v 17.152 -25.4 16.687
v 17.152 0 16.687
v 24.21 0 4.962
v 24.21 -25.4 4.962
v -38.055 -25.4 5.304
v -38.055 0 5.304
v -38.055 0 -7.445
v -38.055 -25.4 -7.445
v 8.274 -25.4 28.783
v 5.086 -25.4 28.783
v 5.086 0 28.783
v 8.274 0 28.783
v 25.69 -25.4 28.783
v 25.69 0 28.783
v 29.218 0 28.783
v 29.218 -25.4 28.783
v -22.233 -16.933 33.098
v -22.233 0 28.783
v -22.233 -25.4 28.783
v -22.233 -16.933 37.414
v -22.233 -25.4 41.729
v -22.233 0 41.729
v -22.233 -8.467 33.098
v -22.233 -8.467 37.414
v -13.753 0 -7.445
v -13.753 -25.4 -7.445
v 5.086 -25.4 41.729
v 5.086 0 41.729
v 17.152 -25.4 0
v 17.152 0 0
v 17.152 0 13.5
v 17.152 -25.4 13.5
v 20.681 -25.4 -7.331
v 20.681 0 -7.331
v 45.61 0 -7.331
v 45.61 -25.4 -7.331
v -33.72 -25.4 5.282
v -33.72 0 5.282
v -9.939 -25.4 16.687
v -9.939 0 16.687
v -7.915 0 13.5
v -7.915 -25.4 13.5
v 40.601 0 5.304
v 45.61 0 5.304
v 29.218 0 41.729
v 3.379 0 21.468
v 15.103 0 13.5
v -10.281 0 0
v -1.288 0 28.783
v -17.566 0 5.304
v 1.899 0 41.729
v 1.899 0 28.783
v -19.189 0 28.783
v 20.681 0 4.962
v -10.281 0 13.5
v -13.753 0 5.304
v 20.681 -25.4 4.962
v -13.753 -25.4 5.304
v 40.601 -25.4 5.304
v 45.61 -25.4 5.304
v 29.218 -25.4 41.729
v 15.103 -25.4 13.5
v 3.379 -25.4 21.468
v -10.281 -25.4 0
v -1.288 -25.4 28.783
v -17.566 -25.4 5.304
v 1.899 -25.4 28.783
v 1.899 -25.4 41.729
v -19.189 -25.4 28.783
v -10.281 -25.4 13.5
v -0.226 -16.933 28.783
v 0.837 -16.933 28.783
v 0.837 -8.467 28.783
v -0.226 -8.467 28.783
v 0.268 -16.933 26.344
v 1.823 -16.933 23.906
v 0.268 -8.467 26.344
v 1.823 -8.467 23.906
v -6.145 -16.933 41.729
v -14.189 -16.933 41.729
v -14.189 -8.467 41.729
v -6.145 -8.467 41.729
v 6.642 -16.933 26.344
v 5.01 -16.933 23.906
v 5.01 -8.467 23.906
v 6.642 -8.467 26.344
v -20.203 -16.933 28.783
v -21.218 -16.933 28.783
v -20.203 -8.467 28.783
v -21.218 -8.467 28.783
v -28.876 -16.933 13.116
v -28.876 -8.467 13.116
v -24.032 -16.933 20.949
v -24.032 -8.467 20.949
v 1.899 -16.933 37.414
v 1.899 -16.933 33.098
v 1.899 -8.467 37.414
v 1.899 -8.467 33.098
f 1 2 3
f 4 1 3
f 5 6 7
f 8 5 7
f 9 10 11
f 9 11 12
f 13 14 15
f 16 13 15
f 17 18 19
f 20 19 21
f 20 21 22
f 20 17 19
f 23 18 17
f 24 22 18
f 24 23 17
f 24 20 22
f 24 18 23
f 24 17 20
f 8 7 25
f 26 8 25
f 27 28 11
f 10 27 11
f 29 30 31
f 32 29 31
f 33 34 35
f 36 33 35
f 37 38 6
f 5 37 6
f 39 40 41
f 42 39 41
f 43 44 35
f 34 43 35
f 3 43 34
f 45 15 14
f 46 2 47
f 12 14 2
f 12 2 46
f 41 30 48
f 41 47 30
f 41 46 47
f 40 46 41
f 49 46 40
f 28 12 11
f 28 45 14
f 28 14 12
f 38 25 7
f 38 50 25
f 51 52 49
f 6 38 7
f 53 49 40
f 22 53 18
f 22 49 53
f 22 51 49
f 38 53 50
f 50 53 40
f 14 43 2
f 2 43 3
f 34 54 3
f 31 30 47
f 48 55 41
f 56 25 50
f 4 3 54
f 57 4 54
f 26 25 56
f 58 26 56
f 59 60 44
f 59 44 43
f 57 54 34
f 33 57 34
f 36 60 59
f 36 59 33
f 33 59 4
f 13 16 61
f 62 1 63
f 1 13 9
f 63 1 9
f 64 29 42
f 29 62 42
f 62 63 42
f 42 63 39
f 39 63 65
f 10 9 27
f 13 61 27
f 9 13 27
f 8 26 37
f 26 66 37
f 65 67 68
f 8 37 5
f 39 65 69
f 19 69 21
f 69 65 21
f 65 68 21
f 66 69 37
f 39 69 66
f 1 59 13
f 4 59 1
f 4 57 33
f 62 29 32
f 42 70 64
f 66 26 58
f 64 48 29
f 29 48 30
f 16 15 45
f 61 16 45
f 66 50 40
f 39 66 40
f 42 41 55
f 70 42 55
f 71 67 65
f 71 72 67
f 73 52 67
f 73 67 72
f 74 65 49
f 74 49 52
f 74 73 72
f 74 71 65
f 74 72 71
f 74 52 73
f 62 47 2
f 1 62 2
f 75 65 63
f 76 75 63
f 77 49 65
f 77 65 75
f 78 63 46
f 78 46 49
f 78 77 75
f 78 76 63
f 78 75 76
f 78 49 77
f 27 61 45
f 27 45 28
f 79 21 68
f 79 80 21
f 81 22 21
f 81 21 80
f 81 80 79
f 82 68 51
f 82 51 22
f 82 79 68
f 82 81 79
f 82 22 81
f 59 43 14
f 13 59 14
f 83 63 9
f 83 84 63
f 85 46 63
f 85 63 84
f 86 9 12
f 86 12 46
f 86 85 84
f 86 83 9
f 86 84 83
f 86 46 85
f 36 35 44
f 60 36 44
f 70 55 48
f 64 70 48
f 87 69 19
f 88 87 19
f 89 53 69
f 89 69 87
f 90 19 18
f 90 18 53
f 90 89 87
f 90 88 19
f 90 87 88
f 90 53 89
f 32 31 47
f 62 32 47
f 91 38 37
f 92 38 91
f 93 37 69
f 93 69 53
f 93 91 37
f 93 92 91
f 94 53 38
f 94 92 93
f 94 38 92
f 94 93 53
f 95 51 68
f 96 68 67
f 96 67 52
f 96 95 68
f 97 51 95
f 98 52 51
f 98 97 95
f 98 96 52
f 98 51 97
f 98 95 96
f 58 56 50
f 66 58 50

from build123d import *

# Parameters (mm, degrees)
F1_DEPTH = 25.4


with BuildPart() as f1:
    # F0 (on Front) → F1 (new body)
    with BuildSketch(Plane.XZ):
        with BuildLine():
            add(Edge.make_bspline(
                [(-33.719659, 5.282047), (-28.87602, 13.115586), (-24.032382, 20.949125), (-19.188743, 28.782664)],
                knots=[0, 0, 0, 0, 27.630174, 27.630174, 27.630174, 27.630174], degree=3))
            Line((-33.719659, 5.282047), (-38.055241, 5.303812))
            Line((-38.055241, 5.303812), (-38.055241, -7.445157))
            Line((-38.055241, -7.445157), (-13.75252, -7.445157))
            Line((-13.75252, -7.445157), (-13.75252, 5.303812))
            Line((-13.75252, 5.303812), (-17.565828, 5.303812))
            Line((-17.565828, 5.303812), (-9.939212, 16.686819))
            Line((-9.939212, 16.686819), (-7.91495, 13.499577))
            Line((-7.91495, 13.499577), (-10.280703, 13.499577))
            Line((-10.280703, 13.499577), (-10.280703, 0))
            Line((-10.280703, 0), (17.152347, 0))
            Line((17.152347, 0), (17.152347, 13.499577))
            Line((17.152347, 13.499577), (15.103405, 13.499577))
            Line((15.103405, 13.499577), (17.152347, 16.686819))
            Line((17.152347, 16.686819), (24.20981, 4.962322))
            Line((24.20981, 4.962322), (20.681079, 4.962322))
            Line((20.681079, 4.962322), (20.681079, -7.331326))
            Line((20.681079, -7.331326), (45.609865, -7.331326))
            Line((45.609865, -7.331326), (45.609865, 5.303812))
            Line((45.609865, 5.303812), (40.601343, 5.303812))
            Line((40.601343, 5.303812), (25.6896, 28.782664))
            Line((25.6896, 28.782664), (29.218335, 28.782664))
            Line((29.218335, 28.782664), (29.218335, 41.729435))
            Line((29.218335, 41.729435), (5.086357, 41.729435))
            Line((5.086357, 41.729435), (5.086357, 28.782664))
            Line((5.086357, 28.782664), (8.273601, 28.782664))
            add(Edge.make_bspline(
                [(3.378906, 21.467682), (5.010471, 23.906009), (6.642036, 26.344337), (8.273601, 28.782664)],
                knots=[0, 0, 0, 0, 8.801534, 8.801534, 8.801534, 8.801534], degree=3))
            add(Edge.make_bspline(
                [(-1.288126, 28.782664), (0.267551, 26.344337), (1.823229, 23.906009), (3.378906, 21.467682)],
                knots=[0, 0, 0, 0, 8.67699, 8.67699, 8.67699, 8.67699], degree=3))
            add(Edge.make_bspline(
                [(1.899114, 28.782664), (0.836701, 28.782664), (-0.225713, 28.782664), (-1.288126, 28.782664)],
                knots=[0, 0, 0, 0, 3.18724, 3.18724, 3.18724, 3.18724], degree=3))
            add(Edge.make_bspline(
                [(1.899114, 41.729435), (1.899114, 37.413845), (1.899114, 33.098254), (1.899114, 28.782664)],
                knots=[0, 0, 0, 0, 12.946771, 12.946771, 12.946771, 12.946771], degree=3))
            add(Edge.make_bspline(
                [(-22.23286, 41.729435), (-14.188869, 41.729435), (-6.144877, 41.729435), (1.899114, 41.729435)],
                knots=[0, 0, 0, 0, 24.131975, 24.131975, 24.131975, 24.131975], degree=3))
            add(Edge.make_bspline(
                [(-22.23286, 28.782664), (-22.23286, 33.098254), (-22.23286, 37.413845), (-22.23286, 41.729435)],
                knots=[0, 0, 0, 0, 12.946771, 12.946771, 12.946771, 12.946771], degree=3))
            add(Edge.make_bspline(
                [(-19.188743, 28.782664), (-20.203449, 28.782664), (-21.218155, 28.782664), (-22.23286, 28.782664)],
                knots=[0, 0, 0, 0, 3.044117, 3.044117, 3.044117, 3.044117], degree=3))
        make_face()
    extrude(amount=F1_DEPTH)


solid = f1.part
